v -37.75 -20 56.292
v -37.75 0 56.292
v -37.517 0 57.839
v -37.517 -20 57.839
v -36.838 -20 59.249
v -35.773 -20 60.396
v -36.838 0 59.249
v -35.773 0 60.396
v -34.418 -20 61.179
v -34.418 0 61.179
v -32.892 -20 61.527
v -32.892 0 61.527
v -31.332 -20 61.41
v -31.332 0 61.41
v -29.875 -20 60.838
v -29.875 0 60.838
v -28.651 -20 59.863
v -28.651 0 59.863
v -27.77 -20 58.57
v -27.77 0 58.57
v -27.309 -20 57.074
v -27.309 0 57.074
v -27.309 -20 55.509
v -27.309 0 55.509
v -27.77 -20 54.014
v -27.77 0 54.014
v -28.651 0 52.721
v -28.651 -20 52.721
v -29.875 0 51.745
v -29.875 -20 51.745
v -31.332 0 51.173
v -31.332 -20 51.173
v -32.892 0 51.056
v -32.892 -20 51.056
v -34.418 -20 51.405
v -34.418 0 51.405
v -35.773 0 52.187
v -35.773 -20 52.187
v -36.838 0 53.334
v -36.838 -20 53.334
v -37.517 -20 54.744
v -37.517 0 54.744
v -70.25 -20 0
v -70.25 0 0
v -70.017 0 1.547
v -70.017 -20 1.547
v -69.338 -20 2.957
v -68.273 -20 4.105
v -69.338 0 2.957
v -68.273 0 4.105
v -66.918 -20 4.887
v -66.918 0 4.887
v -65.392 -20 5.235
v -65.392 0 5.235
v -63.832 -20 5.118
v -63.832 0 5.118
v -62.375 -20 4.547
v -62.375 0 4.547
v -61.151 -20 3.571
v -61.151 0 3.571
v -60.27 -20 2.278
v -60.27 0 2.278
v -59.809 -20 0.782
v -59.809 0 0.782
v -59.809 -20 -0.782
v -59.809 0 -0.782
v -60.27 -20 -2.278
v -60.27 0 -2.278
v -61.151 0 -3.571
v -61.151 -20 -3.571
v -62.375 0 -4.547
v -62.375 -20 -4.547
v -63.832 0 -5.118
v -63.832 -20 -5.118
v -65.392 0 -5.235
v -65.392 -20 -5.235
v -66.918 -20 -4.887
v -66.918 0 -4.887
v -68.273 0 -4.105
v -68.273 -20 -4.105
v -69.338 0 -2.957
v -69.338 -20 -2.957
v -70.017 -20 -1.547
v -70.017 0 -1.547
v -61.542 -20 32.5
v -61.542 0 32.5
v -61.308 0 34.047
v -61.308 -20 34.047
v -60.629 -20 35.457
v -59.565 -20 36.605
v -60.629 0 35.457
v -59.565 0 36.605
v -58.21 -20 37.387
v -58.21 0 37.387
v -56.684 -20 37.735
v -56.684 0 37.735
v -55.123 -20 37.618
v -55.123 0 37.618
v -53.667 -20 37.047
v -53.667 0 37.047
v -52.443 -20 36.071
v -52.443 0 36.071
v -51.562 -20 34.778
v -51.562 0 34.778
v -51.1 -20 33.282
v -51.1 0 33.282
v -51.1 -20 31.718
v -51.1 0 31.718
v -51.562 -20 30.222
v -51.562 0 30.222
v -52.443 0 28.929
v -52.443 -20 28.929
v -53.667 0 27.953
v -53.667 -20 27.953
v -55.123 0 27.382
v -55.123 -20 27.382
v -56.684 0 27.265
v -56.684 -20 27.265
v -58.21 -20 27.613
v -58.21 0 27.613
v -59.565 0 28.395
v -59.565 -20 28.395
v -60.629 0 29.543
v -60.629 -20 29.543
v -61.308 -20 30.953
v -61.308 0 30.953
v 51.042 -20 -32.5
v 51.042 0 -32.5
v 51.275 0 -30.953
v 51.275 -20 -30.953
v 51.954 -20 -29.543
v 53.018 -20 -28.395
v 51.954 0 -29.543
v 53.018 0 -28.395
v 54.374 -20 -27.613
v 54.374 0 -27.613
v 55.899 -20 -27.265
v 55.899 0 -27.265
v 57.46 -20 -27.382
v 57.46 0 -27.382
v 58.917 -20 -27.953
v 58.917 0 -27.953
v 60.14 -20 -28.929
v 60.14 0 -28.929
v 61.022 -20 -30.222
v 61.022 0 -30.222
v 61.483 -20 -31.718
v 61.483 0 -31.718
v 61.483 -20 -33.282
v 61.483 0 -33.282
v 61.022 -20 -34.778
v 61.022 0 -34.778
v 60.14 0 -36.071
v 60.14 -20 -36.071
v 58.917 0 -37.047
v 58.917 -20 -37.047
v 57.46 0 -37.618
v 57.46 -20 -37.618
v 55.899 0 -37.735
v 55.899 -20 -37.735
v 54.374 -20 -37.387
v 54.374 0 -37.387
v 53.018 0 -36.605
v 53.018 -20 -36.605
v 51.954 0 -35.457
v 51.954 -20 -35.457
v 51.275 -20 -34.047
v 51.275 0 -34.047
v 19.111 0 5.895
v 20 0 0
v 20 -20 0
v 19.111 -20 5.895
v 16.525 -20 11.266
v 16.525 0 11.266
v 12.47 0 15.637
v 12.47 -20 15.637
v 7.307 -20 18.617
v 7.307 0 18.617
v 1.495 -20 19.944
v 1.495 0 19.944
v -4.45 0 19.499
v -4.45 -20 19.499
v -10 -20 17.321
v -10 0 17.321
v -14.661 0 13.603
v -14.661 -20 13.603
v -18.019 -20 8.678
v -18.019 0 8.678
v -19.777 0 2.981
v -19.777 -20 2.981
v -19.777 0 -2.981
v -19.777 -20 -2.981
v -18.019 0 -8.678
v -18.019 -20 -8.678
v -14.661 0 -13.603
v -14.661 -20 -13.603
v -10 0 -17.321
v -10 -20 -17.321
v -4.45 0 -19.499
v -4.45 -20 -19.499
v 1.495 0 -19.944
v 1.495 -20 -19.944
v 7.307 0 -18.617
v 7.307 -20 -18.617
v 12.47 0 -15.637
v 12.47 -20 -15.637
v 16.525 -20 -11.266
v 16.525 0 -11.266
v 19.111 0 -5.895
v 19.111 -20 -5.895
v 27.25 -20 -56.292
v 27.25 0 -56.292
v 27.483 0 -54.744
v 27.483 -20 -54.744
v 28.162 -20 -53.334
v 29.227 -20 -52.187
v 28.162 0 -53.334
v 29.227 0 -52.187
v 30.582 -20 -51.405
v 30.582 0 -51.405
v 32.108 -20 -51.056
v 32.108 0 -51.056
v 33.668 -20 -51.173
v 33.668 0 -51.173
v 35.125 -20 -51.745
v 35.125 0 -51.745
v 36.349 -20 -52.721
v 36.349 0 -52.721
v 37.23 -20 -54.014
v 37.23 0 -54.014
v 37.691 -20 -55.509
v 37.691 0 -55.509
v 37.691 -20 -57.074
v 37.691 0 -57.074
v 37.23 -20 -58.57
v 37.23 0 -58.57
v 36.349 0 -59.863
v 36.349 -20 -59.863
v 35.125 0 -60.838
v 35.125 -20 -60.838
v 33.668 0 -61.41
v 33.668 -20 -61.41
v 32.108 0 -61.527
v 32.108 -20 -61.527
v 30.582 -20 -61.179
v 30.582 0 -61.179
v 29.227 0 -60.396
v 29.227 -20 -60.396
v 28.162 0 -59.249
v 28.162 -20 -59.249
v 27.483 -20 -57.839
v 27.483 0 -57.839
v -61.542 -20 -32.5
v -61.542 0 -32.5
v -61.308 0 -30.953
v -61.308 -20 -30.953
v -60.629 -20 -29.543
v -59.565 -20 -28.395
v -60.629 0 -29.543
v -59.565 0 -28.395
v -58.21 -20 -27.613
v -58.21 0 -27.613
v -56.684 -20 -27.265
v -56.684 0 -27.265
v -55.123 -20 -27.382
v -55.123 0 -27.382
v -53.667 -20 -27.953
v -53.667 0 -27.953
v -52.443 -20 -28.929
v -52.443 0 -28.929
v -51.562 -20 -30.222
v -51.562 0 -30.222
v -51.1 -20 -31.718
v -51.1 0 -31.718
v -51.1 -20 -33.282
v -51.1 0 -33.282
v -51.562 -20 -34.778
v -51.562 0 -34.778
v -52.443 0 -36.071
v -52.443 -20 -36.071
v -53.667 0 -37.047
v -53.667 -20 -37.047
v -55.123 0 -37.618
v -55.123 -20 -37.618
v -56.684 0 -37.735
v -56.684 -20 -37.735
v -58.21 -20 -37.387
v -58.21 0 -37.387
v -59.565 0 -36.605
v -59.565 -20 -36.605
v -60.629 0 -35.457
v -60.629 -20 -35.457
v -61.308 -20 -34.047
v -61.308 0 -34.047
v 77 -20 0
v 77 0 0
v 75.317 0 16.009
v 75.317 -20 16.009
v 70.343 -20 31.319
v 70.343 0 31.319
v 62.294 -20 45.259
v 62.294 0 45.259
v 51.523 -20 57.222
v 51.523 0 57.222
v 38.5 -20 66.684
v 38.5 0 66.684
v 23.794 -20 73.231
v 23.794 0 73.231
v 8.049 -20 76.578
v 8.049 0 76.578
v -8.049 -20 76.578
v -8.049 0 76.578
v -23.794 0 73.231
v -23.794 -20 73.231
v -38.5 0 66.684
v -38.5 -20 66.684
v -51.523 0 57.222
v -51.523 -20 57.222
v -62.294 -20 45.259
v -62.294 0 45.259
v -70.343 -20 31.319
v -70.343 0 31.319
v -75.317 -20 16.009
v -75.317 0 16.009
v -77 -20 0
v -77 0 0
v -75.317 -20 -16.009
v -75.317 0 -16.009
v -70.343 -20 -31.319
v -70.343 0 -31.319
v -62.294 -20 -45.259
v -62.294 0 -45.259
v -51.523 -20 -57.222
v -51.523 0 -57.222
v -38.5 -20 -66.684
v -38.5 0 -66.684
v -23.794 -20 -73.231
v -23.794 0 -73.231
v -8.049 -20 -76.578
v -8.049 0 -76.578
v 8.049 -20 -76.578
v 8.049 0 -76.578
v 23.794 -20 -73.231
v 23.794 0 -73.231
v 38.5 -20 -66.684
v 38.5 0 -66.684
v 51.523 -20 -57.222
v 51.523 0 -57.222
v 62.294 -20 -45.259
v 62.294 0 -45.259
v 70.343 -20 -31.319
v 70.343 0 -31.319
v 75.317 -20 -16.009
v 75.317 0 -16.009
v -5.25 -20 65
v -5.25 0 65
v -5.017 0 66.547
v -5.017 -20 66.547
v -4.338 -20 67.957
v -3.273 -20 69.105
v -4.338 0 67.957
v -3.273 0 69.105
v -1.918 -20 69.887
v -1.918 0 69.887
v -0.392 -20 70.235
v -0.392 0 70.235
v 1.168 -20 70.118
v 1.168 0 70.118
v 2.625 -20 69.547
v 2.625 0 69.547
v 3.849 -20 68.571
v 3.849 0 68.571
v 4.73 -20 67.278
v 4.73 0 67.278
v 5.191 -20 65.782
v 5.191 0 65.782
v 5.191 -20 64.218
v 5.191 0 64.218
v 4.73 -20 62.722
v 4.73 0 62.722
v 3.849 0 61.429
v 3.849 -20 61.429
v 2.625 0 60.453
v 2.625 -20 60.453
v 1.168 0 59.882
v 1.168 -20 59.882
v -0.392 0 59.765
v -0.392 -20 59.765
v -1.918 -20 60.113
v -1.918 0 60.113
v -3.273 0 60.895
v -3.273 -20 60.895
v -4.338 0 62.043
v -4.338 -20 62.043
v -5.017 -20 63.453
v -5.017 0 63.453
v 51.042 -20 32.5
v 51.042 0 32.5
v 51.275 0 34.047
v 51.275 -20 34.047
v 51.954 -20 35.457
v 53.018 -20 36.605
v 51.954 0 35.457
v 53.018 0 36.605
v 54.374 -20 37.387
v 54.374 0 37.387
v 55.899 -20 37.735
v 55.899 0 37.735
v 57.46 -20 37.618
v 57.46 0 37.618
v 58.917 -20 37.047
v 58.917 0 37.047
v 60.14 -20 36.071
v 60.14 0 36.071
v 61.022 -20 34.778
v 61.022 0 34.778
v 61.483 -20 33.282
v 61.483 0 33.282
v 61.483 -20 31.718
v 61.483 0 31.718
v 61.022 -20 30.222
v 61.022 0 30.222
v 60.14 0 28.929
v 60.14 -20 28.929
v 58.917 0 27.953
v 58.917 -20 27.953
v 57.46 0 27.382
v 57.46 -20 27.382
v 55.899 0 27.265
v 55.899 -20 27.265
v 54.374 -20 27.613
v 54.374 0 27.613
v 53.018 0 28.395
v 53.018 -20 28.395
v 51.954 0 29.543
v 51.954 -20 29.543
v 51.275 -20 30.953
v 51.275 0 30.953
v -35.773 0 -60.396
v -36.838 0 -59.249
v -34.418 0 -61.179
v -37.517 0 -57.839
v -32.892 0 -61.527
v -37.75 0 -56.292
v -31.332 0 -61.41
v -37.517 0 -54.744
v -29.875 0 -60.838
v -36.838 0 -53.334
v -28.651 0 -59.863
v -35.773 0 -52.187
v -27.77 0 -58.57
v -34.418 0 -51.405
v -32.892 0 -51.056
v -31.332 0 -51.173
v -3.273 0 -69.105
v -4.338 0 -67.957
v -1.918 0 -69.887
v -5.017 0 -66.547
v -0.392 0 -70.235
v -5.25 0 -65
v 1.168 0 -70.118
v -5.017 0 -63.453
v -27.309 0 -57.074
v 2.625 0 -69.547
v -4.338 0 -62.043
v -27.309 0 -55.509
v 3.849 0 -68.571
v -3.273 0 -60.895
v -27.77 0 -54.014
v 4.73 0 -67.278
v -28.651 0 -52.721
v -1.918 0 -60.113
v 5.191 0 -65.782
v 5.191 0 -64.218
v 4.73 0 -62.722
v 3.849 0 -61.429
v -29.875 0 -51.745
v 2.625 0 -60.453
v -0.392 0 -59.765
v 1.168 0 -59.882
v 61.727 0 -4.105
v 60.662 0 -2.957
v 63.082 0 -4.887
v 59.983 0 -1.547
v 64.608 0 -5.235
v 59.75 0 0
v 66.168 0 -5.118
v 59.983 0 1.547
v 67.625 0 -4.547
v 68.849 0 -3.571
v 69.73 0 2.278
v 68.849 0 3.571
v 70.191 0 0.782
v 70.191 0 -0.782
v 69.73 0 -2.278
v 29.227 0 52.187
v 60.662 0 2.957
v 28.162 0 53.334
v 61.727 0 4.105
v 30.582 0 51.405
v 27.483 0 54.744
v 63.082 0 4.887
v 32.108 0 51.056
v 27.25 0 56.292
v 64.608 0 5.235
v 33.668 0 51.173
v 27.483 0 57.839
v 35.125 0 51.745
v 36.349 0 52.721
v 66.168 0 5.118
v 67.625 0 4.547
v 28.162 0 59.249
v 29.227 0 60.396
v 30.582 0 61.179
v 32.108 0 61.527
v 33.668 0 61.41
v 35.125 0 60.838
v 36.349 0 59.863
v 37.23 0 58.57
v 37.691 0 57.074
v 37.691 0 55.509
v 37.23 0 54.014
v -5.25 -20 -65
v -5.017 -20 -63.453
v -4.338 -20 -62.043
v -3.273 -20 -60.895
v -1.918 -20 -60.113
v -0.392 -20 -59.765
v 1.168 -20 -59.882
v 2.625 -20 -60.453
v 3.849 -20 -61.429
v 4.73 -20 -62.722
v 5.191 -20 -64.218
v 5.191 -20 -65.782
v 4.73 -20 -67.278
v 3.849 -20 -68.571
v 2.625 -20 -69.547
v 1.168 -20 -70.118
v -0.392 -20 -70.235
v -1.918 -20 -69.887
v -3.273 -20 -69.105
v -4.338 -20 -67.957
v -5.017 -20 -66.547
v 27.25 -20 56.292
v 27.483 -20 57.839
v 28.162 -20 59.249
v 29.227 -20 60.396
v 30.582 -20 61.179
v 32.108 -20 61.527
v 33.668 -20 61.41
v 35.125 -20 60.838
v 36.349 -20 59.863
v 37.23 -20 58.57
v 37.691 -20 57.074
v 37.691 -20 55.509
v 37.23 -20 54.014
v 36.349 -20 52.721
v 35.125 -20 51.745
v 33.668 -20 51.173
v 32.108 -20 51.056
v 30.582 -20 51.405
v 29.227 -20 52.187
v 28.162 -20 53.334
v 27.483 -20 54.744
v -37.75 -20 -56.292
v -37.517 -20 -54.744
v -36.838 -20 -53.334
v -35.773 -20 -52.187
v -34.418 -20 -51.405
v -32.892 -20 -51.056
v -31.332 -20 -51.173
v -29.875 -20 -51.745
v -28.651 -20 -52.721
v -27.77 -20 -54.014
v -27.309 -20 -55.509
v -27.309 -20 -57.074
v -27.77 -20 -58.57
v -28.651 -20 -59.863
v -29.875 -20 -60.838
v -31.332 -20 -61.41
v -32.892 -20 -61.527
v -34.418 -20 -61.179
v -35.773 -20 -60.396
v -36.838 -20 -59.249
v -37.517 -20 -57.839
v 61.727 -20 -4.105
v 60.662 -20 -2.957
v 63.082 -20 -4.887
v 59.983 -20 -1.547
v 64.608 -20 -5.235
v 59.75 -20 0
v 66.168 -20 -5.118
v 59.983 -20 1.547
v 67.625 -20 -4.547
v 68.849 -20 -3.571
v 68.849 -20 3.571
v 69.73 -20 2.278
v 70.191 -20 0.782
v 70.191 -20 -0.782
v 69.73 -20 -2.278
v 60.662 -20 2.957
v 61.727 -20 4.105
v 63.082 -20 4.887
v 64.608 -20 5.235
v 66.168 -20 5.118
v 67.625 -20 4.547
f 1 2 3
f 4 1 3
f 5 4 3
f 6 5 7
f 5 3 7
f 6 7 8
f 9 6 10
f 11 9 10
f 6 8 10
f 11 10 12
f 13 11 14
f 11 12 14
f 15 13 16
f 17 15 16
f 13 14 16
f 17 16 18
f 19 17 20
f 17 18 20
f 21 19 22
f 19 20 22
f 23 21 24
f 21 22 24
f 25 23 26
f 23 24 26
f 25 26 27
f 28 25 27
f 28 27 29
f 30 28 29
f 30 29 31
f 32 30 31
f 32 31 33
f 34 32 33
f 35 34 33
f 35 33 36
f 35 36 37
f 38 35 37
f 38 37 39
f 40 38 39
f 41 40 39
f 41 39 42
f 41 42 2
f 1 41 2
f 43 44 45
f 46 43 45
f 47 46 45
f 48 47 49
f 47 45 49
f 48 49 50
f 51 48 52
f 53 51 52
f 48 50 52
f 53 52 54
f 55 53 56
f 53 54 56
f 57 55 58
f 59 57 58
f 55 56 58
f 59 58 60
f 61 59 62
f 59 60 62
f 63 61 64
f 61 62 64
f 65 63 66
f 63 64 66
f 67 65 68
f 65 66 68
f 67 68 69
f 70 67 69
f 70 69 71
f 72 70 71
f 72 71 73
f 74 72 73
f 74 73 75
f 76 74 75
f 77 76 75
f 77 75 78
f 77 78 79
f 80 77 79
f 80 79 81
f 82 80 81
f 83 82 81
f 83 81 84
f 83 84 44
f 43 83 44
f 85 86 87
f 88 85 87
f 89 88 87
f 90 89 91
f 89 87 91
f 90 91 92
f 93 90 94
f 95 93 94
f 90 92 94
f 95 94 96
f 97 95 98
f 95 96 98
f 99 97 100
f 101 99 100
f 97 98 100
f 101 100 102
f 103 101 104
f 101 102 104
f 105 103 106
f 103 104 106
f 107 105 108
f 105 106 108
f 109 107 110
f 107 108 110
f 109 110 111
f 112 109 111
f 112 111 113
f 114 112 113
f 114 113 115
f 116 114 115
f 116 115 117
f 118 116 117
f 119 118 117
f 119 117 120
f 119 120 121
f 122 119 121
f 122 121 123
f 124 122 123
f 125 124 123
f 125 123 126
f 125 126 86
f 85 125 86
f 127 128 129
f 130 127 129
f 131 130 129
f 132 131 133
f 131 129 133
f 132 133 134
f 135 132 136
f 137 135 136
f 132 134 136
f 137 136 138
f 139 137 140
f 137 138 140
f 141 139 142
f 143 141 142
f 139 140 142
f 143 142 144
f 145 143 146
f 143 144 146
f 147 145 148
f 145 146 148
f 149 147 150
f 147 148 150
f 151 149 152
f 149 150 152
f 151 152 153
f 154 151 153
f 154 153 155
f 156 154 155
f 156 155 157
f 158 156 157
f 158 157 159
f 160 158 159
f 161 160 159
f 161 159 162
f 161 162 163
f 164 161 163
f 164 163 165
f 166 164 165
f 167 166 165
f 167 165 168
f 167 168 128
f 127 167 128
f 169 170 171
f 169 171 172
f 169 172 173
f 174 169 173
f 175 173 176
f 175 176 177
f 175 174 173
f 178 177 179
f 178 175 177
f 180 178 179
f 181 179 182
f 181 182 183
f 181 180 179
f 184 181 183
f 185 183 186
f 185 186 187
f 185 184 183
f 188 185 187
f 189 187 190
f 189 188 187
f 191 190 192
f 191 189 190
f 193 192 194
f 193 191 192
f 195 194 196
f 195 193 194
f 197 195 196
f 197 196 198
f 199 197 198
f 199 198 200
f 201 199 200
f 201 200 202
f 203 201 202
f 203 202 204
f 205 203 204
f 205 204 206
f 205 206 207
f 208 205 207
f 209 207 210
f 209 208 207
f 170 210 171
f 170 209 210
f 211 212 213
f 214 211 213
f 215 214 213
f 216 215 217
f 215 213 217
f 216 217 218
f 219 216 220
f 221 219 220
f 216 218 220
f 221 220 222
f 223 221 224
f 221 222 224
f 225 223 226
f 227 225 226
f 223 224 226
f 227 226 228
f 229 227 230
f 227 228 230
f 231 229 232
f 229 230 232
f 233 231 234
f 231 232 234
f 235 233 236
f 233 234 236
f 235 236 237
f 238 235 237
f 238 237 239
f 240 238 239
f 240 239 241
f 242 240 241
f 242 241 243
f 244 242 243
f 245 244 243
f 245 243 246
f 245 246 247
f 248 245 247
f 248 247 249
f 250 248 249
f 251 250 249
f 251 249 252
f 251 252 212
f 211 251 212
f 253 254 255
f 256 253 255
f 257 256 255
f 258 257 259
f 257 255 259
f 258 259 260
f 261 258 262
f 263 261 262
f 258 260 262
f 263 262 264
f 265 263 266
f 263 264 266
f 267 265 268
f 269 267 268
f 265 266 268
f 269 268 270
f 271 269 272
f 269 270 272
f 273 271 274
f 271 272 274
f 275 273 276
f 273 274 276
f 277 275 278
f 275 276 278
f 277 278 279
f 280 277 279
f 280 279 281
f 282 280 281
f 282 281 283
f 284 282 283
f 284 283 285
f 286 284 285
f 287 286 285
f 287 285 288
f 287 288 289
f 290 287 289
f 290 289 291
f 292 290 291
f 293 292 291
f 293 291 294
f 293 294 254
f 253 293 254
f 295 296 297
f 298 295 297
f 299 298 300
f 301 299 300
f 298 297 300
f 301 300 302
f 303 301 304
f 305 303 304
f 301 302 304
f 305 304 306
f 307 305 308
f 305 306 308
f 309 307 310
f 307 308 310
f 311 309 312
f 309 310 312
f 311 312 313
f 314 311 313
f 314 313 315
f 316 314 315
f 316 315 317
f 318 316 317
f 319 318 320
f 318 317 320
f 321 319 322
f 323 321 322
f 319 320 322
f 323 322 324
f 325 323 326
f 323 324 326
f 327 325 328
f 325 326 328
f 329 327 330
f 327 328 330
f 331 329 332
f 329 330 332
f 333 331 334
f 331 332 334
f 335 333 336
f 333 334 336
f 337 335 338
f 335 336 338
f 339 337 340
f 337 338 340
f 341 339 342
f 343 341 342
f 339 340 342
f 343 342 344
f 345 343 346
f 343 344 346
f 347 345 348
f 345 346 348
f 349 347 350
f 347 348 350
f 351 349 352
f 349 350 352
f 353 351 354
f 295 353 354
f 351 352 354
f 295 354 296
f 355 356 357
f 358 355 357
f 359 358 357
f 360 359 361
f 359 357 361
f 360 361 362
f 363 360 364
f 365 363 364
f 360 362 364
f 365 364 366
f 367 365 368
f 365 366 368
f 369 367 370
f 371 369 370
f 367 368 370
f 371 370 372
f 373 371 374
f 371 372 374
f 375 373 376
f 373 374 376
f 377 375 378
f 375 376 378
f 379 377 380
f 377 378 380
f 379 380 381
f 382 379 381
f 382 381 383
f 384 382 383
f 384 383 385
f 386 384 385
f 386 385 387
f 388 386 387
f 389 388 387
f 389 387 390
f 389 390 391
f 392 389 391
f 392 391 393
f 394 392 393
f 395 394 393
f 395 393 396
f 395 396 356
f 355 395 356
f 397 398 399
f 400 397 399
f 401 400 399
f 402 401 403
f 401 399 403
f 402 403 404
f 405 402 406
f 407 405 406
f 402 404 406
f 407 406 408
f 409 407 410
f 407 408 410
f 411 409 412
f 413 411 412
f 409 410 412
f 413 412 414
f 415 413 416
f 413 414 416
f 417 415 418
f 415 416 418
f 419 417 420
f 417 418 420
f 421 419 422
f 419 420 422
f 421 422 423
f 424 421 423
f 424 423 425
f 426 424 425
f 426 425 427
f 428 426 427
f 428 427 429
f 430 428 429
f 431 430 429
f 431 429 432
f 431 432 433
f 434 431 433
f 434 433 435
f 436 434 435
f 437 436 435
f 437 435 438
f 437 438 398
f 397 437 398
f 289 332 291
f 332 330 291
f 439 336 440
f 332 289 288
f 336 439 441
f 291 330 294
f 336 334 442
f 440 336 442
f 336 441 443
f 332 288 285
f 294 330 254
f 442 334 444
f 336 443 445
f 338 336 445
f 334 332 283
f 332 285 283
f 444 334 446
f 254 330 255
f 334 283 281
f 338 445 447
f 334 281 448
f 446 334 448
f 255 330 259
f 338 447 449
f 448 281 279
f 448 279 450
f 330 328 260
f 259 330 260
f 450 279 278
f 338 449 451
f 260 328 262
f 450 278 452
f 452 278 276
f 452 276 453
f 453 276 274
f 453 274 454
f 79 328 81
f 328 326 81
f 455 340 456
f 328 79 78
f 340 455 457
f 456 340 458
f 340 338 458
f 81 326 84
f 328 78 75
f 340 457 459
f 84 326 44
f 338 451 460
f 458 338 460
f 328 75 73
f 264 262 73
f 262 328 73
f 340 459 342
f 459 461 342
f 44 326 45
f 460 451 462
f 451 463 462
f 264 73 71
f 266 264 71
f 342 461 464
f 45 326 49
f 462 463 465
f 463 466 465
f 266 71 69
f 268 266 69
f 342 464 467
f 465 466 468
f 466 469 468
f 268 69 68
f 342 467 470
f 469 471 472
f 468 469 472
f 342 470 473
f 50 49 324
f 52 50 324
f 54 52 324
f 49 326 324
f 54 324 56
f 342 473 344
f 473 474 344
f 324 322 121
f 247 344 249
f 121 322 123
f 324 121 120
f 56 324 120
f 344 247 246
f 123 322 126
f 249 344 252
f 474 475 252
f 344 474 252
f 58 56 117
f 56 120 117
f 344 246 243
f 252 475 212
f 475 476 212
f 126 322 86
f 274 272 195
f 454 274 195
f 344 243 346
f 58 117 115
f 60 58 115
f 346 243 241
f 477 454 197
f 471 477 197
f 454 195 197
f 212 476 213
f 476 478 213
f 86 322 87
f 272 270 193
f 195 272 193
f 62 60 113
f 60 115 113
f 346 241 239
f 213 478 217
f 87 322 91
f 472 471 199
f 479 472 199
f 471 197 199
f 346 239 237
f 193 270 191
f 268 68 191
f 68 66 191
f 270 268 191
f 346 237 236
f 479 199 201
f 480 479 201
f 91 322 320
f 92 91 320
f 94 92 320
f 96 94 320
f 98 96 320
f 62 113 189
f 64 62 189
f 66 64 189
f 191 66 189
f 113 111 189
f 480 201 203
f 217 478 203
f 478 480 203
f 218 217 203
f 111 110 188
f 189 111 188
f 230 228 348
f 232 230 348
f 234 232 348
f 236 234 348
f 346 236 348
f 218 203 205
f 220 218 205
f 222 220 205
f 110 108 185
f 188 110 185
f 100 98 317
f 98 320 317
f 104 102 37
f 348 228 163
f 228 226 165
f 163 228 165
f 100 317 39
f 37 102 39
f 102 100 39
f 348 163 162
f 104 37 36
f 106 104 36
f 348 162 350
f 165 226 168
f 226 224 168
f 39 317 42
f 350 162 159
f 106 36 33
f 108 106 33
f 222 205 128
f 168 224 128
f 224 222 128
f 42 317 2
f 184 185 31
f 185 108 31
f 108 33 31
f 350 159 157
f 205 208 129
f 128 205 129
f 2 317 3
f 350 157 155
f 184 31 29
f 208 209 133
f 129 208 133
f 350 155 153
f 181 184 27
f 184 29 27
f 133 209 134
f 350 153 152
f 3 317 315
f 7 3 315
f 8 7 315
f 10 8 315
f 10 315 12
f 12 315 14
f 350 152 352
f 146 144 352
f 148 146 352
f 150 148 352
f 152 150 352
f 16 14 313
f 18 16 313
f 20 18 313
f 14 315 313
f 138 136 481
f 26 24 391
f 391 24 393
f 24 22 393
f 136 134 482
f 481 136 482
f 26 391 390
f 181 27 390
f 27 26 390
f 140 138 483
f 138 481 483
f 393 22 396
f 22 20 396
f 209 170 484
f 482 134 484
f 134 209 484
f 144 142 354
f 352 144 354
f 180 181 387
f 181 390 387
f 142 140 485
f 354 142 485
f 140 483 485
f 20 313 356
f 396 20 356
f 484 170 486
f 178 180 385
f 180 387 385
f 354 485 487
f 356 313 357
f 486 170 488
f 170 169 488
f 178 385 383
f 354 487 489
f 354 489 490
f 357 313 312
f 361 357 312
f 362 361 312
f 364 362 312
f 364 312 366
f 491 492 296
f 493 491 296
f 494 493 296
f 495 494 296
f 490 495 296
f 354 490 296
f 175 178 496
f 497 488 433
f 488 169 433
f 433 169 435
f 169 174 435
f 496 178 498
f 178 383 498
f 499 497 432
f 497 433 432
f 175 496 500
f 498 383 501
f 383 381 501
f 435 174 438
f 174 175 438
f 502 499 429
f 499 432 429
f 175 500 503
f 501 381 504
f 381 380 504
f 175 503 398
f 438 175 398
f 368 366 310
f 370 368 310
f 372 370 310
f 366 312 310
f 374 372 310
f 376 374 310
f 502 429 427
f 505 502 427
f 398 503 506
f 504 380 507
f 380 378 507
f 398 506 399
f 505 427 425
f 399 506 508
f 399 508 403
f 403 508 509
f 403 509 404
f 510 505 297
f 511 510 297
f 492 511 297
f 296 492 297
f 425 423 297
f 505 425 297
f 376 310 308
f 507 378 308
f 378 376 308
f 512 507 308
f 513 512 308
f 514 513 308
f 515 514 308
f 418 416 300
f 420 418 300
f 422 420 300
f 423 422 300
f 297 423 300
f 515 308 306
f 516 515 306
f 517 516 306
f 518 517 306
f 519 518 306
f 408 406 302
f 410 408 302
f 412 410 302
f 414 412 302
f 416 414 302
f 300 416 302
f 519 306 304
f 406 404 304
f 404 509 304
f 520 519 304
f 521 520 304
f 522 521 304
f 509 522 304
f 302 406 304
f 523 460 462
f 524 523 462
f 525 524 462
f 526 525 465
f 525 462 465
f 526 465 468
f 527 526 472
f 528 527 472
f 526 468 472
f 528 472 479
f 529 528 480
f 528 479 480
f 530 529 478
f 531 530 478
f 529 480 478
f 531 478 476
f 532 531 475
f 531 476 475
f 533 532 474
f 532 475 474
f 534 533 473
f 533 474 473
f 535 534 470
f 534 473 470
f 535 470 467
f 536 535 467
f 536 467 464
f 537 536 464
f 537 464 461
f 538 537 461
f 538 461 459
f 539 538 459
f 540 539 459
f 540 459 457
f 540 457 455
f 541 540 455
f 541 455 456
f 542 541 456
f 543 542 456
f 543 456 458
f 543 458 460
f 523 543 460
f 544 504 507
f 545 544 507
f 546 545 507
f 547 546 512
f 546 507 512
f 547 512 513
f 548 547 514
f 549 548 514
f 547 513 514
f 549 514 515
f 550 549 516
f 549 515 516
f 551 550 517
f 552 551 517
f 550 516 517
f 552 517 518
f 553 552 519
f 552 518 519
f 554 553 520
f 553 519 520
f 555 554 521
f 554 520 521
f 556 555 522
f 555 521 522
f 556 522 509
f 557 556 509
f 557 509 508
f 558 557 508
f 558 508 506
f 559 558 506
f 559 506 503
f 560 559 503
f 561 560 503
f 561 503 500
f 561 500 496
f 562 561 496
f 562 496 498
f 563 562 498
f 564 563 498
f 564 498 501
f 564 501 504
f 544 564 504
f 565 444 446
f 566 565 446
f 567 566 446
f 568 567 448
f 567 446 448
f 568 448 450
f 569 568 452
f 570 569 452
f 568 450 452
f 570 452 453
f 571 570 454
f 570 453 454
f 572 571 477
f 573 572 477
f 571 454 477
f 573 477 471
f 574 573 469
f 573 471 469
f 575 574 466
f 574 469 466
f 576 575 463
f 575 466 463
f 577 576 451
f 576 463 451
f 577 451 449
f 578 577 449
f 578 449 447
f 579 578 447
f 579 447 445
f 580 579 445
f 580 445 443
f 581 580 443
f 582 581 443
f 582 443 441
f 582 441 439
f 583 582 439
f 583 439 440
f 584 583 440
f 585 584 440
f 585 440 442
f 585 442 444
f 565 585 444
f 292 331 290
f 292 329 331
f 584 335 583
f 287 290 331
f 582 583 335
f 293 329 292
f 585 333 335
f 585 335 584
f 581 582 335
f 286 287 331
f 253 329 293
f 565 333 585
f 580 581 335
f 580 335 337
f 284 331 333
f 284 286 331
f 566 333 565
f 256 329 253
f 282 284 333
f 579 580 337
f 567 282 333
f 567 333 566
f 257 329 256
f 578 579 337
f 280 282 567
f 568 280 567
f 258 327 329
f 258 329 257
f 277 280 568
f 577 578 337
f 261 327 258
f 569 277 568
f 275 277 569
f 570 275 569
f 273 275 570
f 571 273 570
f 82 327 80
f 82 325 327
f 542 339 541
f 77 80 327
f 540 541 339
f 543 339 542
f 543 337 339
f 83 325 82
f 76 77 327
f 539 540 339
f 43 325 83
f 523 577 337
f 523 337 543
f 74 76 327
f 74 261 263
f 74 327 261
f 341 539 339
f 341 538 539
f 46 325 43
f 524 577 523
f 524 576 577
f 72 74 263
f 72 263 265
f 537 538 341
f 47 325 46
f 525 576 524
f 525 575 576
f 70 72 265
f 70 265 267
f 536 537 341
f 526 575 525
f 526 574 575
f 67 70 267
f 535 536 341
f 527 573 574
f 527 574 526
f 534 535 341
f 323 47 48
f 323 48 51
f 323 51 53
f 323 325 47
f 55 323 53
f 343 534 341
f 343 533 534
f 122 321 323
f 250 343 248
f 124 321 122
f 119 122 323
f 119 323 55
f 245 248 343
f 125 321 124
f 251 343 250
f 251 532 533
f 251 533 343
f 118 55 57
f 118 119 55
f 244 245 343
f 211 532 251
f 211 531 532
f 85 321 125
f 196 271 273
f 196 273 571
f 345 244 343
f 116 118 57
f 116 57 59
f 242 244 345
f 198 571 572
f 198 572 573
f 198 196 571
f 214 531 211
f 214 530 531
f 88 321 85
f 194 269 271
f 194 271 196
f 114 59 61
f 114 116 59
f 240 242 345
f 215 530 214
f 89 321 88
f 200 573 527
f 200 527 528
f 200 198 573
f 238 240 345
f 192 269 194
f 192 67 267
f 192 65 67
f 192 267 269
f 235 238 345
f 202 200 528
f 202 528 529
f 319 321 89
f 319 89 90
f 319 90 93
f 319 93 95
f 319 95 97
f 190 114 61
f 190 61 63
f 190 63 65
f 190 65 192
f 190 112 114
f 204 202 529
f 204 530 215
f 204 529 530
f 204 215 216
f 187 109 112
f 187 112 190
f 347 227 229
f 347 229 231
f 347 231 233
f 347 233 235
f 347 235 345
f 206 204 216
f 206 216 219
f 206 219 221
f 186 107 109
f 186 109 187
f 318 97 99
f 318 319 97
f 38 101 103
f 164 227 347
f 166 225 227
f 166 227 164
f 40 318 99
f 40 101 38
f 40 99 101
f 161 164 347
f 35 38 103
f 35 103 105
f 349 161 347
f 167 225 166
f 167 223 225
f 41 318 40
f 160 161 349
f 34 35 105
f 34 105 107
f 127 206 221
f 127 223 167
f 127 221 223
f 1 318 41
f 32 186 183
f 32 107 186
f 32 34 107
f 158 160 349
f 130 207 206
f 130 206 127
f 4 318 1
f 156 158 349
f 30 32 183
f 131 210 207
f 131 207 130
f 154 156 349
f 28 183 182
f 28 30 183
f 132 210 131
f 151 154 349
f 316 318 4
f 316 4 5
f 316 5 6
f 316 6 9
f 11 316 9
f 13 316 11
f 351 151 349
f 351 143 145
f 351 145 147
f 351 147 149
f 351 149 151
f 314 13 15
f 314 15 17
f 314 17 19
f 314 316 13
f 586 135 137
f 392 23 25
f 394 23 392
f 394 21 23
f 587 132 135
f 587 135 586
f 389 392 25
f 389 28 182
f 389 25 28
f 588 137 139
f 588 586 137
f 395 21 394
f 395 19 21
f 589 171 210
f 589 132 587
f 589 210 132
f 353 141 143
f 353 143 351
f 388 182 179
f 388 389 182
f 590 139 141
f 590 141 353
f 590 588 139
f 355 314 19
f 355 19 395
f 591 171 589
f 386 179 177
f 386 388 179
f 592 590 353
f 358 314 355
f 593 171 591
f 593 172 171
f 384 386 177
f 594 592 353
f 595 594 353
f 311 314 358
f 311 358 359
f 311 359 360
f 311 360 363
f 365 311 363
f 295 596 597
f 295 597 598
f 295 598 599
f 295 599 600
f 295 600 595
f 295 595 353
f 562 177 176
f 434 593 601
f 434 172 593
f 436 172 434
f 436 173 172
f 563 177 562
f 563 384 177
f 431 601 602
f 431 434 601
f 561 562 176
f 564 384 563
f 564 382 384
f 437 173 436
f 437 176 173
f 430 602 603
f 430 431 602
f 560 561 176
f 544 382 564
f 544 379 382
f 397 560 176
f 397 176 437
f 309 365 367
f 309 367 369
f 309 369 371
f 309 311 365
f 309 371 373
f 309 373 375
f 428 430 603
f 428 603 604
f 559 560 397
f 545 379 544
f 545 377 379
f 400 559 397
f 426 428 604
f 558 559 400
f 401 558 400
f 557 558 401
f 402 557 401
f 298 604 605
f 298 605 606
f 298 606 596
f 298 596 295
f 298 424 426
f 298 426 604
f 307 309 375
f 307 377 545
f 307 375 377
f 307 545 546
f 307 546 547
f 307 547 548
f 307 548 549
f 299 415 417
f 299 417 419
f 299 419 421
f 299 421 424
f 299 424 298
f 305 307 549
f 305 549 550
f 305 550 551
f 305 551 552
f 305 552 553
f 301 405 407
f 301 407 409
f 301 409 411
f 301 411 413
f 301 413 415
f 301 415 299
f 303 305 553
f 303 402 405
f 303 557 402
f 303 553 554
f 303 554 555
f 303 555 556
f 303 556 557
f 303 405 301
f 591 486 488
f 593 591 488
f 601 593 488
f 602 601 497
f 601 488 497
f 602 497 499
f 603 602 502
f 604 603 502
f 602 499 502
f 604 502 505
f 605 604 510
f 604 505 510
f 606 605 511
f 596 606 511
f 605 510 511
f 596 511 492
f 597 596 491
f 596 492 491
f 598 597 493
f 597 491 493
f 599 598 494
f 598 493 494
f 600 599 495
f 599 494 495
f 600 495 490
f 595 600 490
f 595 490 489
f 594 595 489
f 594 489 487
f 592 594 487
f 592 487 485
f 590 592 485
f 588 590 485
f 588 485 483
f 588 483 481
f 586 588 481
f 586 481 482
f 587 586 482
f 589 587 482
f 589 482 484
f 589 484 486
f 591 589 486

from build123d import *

# Parameters (mm, degrees)
F0_R     = 77
F0_R_2   = 20
F1_DEPTH = 20
F3_D     = 10.5


with BuildPart() as f1:
    # F0 (on Front) → F1 (new body)
    with BuildSketch(Plane.XZ):
        Circle(F0_R)
        Circle(F0_R_2, mode=Mode.SUBTRACT)
    extrude(amount=F1_DEPTH)

    # F3 (through all)
    with Locations(Plane.XZ.offset(20)):
        with Locations((56.291651, -32.5), (65, 0), (56.291651, 32.5), (32.5, 56.291651), (0, 65), (-32.5, 56.291651), (-56.291651, 32.5), (-65, 0), (-56.291651, -32.5), (-32.5, -56.291651), (0, -65), (32.5, -56.291651)):
            Hole(F3_D / 2)


solid = f1.part
